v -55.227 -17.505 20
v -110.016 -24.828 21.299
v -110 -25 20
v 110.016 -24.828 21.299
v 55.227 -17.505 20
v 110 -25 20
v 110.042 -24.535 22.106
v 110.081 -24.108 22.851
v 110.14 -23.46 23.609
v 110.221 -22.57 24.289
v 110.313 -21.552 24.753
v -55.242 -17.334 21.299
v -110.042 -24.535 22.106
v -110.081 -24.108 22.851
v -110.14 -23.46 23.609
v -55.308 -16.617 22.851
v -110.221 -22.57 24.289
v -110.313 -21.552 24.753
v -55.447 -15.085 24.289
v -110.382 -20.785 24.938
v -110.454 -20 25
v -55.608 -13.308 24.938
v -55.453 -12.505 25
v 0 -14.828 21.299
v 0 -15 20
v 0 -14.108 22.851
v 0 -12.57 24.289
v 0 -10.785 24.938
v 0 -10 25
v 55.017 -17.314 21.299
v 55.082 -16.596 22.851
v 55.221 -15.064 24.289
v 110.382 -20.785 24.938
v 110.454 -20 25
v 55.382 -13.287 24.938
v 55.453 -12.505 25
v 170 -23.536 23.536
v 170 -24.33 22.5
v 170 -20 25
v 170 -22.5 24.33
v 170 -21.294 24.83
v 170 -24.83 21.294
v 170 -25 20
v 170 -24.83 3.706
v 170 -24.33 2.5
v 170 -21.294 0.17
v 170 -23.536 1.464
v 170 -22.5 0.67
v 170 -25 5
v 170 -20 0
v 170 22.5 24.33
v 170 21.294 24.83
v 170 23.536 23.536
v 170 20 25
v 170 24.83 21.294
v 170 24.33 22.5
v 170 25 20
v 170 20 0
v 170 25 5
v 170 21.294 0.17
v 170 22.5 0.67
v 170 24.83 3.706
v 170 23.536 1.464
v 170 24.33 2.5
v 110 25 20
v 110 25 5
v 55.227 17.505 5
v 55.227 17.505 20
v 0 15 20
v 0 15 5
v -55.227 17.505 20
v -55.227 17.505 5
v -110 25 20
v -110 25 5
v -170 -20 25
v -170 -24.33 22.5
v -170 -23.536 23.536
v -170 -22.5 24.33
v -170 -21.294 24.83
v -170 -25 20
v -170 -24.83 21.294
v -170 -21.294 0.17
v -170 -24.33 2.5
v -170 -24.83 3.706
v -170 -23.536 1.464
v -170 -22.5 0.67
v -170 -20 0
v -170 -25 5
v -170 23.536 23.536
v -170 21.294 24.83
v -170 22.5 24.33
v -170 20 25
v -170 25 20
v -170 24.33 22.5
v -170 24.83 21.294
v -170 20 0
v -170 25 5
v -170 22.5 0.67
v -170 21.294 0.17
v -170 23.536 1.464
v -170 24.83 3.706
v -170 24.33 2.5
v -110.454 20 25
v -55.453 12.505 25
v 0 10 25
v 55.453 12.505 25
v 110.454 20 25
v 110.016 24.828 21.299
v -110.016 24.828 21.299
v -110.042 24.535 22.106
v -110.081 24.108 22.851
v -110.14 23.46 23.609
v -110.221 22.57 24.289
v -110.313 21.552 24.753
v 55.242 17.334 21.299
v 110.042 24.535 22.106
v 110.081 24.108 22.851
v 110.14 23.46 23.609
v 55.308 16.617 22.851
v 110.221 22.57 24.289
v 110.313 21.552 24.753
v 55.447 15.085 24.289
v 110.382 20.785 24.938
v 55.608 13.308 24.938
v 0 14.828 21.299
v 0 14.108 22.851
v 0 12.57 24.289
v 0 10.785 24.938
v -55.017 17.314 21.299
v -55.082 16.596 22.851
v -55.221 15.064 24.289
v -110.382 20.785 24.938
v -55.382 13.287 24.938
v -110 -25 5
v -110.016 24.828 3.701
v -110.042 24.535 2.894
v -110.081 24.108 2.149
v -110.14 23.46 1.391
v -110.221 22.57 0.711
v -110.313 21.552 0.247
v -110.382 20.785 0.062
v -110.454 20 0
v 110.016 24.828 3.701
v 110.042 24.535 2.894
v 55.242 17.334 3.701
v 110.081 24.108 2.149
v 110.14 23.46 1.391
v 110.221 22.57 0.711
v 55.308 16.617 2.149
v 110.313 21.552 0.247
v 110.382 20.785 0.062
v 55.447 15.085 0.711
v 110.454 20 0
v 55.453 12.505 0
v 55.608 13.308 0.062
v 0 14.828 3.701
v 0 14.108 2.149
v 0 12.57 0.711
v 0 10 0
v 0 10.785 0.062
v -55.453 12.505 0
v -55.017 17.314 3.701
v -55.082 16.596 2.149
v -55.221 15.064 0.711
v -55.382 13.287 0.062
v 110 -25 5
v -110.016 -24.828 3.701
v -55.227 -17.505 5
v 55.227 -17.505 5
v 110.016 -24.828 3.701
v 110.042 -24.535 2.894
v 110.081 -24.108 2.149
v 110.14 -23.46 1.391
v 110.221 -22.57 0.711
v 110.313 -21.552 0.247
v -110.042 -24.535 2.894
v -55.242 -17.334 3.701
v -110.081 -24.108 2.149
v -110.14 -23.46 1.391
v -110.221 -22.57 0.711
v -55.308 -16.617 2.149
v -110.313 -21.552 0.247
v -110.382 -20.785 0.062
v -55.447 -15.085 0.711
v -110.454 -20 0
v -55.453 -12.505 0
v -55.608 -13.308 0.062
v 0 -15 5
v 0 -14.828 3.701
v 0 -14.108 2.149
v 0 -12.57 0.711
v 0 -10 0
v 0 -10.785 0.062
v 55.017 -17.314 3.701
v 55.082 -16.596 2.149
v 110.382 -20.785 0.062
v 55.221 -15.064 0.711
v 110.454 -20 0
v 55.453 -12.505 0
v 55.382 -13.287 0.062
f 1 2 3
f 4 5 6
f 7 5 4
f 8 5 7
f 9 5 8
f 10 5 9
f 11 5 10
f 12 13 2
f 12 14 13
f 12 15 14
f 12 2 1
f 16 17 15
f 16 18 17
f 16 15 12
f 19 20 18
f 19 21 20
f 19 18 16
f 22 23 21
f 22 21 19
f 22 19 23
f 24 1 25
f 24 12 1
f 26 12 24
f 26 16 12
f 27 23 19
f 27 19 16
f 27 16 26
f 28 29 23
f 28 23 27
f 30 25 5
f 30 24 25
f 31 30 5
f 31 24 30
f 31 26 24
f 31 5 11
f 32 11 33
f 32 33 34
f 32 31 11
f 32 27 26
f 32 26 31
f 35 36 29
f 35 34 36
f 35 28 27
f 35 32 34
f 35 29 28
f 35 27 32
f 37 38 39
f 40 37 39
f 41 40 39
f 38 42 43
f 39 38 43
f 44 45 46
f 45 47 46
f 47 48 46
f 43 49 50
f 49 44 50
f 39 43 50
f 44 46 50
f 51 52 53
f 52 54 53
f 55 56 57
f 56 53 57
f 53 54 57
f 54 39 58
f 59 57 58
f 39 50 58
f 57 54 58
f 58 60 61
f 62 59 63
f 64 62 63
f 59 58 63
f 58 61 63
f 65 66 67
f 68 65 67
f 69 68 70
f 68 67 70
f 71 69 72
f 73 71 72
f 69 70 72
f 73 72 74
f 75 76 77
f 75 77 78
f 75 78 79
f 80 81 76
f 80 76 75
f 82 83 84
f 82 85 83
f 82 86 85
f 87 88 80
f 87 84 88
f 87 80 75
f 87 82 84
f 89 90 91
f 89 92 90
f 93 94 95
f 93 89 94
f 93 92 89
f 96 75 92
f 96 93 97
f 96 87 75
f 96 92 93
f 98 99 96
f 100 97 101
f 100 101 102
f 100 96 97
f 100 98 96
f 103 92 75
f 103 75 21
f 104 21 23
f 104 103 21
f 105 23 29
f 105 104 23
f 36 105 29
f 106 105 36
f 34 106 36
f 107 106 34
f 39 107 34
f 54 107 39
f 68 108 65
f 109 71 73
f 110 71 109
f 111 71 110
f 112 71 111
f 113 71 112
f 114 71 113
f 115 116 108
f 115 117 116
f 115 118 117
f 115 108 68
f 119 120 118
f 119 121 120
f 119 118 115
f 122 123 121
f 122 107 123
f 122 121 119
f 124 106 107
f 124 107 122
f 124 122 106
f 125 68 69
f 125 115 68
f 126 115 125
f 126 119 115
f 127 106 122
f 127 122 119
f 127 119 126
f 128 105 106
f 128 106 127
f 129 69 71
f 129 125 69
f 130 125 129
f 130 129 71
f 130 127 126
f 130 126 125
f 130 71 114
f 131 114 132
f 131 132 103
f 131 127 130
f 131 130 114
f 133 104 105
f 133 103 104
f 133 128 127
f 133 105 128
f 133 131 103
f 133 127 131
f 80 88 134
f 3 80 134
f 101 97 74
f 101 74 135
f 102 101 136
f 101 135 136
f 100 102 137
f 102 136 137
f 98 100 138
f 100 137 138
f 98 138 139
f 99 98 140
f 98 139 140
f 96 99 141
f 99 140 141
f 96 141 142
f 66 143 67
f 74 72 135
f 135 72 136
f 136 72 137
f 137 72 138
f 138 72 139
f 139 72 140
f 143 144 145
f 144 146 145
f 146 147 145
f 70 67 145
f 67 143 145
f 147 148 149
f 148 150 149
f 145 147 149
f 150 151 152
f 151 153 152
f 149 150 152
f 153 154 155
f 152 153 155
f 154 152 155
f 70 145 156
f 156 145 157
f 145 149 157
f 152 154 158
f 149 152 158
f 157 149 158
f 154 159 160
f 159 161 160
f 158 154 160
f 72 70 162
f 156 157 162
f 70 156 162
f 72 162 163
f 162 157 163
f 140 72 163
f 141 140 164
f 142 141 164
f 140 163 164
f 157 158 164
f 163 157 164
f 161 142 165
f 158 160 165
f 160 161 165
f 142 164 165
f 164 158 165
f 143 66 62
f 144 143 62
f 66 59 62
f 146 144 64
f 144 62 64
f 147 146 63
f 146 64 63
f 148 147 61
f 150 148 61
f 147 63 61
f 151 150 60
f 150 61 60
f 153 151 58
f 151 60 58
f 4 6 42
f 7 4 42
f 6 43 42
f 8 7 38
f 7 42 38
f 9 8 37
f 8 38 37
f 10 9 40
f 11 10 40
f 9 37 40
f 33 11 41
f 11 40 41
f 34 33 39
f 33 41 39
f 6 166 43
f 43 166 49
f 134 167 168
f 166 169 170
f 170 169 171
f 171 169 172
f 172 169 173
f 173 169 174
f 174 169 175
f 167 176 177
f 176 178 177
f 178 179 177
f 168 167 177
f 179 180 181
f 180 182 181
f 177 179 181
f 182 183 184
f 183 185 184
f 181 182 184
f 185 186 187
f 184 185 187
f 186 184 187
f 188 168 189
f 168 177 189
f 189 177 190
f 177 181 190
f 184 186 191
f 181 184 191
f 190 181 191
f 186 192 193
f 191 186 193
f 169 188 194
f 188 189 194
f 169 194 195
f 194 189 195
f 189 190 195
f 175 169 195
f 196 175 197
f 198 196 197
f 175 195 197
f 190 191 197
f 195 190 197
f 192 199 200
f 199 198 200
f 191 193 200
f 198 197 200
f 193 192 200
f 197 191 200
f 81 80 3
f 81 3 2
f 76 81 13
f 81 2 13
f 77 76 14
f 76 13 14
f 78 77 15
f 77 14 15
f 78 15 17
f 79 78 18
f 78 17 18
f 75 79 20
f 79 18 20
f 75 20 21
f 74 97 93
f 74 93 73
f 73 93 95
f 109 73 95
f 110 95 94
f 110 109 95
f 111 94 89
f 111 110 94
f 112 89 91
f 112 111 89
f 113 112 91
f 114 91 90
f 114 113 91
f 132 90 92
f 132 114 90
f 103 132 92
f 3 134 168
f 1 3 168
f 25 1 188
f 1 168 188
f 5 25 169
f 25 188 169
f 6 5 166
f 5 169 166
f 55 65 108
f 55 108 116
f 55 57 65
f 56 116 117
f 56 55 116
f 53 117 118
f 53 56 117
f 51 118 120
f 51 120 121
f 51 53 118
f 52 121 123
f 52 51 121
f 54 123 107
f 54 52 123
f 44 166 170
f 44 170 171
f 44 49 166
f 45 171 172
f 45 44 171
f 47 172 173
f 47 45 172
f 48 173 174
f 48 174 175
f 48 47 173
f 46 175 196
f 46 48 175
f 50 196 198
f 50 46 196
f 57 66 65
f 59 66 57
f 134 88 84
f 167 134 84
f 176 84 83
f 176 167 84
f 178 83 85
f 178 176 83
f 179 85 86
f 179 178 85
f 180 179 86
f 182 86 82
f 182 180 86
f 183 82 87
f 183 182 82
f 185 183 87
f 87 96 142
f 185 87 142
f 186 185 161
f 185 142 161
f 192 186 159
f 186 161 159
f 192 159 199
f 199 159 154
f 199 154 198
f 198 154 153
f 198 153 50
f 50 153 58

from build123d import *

# Parameters (mm, degrees)
F0_W     = 60
F0_H     = 50
F0_W_2   = 60.0000097896
F1_DEPTH = 25
F2_R     = 5


# Not quite as in the source:
# - ends of sketch curves that miss each other by under 0.0002 mm in the source are joined


with BuildPart() as f1:
    # F0 (on Top) → F1 (new body)
    with BuildSketch(Plane.XY):
        with Locations((-140, 0)):
            Rectangle(F0_W, F0_H)
        with BuildLine():
            Line((-110, 25), (-110, -25))
            ThreePointArc((-110, -25), (-4.8948e-06, -15), (109.9999902104, -25))
            Line((109.9999902104, -25), (109.9999902104, 25))
            ThreePointArc((109.9999902104, 25), (0, 14.9999991026), (-110, 25))
        make_face()
        with Locations((139.9999951052, 0)):
            Rectangle(F0_W_2, F0_H)
    extrude(amount=F1_DEPTH)

    # F2
    f2_edges = [f1.edges().sort_by_distance(p)[0] for p in [
        (-140, -25, 25),
        (-5e-06, -15, 25),
        (139.999995, -25, 25),
        (139.999995, 25, 25),
        (-5e-06, 14.999999, 25),
        (-140, 25, 25),
        (-140, -25, 0),
        (-5e-06, -15, 0),
        (139.999995, -25, 0),
        (-140, 25, 0),
        (-5e-06, 14.999999, 0),
        (139.999995, 25, 0),
    ]]
    fillet(f2_edges, radius=F2_R)


solid = f1.part
